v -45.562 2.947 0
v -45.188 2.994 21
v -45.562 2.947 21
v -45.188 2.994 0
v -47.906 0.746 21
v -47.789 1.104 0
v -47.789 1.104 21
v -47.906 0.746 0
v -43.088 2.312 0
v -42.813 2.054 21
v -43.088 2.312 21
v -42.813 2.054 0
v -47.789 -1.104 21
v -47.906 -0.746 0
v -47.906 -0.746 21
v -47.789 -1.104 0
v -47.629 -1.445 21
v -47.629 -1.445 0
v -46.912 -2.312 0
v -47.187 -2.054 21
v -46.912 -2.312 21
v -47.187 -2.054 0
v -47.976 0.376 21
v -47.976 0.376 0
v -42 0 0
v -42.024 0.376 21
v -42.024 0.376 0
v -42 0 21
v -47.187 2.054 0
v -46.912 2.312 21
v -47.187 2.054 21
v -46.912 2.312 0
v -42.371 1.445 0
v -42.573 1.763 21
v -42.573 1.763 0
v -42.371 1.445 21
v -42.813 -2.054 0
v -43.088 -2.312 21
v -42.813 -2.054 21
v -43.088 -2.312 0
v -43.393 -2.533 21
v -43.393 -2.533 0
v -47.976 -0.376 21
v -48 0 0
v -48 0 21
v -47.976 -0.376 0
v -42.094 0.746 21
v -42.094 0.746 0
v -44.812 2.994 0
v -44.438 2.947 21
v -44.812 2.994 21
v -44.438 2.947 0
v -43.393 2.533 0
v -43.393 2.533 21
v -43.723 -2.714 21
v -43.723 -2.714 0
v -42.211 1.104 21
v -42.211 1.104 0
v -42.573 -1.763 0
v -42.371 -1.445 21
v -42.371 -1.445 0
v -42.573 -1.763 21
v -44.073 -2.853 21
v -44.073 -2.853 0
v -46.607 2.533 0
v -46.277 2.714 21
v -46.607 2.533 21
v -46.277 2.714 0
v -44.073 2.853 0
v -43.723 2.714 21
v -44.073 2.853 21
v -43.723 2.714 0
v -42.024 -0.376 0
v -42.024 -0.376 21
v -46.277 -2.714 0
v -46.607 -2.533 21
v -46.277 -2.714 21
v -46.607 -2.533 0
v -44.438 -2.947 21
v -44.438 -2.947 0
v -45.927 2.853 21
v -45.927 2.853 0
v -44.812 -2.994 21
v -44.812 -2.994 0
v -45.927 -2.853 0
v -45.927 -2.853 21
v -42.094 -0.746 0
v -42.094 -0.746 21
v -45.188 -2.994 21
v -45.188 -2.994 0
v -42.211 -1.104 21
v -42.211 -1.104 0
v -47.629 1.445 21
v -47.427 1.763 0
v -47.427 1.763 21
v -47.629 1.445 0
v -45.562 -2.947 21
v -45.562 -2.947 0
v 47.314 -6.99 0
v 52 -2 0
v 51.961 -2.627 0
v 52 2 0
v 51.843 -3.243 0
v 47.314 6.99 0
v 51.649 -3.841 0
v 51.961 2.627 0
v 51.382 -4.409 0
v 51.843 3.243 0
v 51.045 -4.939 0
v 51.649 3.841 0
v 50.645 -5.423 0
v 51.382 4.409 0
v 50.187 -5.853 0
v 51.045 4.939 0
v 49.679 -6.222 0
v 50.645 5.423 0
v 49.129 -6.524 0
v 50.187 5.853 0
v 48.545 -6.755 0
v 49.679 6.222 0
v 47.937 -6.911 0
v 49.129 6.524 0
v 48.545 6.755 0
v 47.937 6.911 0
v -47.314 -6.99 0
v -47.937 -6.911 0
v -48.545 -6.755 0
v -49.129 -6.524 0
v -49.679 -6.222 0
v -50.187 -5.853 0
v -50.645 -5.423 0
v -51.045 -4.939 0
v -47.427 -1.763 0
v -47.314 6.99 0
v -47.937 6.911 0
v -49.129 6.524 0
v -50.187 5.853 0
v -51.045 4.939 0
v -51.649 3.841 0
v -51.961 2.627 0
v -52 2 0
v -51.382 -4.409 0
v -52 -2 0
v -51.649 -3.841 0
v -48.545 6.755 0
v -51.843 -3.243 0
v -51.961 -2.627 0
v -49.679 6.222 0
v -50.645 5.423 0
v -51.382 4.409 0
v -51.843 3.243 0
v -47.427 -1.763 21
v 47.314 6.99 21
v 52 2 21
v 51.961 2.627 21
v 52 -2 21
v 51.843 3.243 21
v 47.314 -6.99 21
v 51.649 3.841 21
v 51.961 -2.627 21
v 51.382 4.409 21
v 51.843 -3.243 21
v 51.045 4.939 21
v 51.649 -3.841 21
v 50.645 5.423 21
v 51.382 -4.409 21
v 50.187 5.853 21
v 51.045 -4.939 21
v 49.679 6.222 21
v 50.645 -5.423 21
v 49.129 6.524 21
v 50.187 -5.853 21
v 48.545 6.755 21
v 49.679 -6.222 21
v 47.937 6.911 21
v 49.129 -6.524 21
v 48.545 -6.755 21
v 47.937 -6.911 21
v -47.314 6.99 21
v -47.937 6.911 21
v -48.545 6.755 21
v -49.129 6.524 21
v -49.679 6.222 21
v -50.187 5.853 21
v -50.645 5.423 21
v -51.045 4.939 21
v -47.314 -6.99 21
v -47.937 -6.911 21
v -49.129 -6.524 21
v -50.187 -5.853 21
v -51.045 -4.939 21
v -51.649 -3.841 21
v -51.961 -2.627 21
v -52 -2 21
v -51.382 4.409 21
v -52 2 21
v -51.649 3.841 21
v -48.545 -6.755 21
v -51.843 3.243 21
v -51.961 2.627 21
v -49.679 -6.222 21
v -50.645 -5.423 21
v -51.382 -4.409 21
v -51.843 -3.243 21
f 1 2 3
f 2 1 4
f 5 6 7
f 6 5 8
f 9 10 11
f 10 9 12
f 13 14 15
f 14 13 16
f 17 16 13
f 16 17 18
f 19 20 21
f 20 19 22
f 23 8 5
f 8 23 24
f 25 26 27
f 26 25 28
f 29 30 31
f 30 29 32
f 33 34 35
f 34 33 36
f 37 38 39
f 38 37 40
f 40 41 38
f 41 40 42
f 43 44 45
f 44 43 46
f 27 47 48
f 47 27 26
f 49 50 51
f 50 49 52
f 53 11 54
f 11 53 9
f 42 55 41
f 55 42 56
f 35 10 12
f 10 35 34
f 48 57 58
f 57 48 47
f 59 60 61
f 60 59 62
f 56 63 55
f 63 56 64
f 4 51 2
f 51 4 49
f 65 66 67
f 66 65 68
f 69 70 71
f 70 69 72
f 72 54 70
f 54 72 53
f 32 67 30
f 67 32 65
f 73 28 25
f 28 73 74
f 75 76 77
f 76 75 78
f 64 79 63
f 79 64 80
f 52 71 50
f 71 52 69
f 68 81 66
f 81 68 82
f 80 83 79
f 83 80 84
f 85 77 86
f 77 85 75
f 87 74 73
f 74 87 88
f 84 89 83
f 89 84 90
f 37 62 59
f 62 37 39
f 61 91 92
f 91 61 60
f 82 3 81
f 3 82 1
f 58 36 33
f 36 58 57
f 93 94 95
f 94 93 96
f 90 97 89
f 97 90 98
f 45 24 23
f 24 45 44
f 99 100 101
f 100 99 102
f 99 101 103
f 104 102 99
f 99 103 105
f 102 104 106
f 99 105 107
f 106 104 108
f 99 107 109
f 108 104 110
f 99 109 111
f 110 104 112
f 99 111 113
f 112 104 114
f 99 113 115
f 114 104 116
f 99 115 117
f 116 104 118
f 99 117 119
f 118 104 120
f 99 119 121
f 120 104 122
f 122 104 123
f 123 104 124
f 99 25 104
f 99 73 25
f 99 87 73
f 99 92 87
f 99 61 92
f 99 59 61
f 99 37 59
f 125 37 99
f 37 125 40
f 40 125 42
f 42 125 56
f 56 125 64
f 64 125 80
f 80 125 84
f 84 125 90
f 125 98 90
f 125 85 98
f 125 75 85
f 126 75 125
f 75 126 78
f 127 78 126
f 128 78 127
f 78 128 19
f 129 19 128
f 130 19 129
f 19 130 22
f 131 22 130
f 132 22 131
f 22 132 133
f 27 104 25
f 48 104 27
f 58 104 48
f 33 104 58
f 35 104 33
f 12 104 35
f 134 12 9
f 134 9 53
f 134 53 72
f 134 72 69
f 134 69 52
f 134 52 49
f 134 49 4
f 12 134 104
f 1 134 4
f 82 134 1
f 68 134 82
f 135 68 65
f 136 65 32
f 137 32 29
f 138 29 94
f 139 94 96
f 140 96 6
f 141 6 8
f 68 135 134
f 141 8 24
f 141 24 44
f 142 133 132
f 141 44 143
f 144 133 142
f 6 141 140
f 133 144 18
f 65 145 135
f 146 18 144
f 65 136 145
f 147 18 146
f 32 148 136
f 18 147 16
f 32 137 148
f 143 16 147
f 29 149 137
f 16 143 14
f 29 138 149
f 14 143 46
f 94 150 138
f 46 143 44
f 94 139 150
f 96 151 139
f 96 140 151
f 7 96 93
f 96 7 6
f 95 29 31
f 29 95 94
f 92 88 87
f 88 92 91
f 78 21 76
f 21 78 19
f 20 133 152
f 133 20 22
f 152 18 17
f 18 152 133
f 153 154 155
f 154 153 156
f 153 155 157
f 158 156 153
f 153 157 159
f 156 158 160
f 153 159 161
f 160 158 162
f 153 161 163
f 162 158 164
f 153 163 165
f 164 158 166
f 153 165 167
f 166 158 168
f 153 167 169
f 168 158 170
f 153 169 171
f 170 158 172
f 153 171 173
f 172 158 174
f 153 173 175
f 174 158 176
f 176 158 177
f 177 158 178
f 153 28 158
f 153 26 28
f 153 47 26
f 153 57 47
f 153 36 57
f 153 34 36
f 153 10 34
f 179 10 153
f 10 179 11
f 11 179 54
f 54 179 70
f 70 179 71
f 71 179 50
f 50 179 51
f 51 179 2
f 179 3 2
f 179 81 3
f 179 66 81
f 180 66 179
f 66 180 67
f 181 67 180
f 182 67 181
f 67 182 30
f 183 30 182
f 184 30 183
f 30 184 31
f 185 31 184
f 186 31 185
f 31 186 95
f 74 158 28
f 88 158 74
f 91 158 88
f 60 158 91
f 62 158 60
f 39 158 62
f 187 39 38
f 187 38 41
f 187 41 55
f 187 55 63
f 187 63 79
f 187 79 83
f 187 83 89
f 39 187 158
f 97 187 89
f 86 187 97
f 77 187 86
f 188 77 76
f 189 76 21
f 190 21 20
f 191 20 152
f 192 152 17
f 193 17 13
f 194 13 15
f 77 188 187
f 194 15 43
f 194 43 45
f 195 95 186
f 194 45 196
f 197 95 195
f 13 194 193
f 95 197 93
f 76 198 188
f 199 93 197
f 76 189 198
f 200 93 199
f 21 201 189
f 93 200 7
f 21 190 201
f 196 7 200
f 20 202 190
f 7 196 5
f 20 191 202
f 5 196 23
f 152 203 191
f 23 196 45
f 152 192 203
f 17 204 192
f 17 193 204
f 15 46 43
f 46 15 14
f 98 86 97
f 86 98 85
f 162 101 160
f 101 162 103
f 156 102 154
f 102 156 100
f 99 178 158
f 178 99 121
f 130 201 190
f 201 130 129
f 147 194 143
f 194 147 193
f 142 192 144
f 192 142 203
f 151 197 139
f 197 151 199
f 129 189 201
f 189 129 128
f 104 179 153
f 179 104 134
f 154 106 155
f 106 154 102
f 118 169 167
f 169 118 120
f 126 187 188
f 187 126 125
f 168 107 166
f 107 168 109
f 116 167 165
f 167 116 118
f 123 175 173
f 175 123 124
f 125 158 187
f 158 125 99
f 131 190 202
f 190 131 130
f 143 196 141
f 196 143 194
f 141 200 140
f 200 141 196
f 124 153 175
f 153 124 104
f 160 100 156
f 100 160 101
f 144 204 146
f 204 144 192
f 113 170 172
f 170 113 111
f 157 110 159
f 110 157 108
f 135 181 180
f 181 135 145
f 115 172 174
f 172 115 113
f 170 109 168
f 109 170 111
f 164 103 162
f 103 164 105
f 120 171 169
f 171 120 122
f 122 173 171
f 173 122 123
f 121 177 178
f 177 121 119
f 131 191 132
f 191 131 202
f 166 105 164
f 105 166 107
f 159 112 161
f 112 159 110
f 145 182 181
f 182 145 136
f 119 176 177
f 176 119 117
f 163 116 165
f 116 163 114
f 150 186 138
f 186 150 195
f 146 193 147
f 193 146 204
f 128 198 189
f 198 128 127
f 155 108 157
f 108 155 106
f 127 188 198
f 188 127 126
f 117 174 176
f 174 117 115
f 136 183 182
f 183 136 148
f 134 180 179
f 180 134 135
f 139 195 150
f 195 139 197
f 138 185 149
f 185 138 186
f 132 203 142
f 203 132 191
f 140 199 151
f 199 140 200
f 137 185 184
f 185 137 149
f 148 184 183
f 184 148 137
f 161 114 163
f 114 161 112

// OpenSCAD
$fn = 50;


difference() {
	union() {
		hull() {
			translate(v = [-47.0000000000, 2.0000000000, 0]) {
				cylinder(h = 21, r = 5);
			}
			translate(v = [47.0000000000, 2.0000000000, 0]) {
				cylinder(h = 21, r = 5);
			}
			translate(v = [-47.0000000000, -2.0000000000, 0]) {
				cylinder(h = 21, r = 5);
			}
			translate(v = [47.0000000000, -2.0000000000, 0]) {
				cylinder(h = 21, r = 5);
			}
		}
	}
	union() {
		translate(v = [-45.0000000000, 0.0000000000, 0]) {
			cylinder(h = 21, r = 3.0000000000);
		}
		translate(v = [-45.0000000000, 0.0000000000, 0]) {
			cylinder(h = 21, r = 1.5000000000);
		}
		translate(v = [-45.0000000000, 0.0000000000, 0]) {
			cylinder(h = 21, r = 1.5000000000);
		}
		translate(v = [-45.0000000000, 0.0000000000, 0]) {
			cylinder(h = 21, r = 1.5000000000);
		}
	}
}
